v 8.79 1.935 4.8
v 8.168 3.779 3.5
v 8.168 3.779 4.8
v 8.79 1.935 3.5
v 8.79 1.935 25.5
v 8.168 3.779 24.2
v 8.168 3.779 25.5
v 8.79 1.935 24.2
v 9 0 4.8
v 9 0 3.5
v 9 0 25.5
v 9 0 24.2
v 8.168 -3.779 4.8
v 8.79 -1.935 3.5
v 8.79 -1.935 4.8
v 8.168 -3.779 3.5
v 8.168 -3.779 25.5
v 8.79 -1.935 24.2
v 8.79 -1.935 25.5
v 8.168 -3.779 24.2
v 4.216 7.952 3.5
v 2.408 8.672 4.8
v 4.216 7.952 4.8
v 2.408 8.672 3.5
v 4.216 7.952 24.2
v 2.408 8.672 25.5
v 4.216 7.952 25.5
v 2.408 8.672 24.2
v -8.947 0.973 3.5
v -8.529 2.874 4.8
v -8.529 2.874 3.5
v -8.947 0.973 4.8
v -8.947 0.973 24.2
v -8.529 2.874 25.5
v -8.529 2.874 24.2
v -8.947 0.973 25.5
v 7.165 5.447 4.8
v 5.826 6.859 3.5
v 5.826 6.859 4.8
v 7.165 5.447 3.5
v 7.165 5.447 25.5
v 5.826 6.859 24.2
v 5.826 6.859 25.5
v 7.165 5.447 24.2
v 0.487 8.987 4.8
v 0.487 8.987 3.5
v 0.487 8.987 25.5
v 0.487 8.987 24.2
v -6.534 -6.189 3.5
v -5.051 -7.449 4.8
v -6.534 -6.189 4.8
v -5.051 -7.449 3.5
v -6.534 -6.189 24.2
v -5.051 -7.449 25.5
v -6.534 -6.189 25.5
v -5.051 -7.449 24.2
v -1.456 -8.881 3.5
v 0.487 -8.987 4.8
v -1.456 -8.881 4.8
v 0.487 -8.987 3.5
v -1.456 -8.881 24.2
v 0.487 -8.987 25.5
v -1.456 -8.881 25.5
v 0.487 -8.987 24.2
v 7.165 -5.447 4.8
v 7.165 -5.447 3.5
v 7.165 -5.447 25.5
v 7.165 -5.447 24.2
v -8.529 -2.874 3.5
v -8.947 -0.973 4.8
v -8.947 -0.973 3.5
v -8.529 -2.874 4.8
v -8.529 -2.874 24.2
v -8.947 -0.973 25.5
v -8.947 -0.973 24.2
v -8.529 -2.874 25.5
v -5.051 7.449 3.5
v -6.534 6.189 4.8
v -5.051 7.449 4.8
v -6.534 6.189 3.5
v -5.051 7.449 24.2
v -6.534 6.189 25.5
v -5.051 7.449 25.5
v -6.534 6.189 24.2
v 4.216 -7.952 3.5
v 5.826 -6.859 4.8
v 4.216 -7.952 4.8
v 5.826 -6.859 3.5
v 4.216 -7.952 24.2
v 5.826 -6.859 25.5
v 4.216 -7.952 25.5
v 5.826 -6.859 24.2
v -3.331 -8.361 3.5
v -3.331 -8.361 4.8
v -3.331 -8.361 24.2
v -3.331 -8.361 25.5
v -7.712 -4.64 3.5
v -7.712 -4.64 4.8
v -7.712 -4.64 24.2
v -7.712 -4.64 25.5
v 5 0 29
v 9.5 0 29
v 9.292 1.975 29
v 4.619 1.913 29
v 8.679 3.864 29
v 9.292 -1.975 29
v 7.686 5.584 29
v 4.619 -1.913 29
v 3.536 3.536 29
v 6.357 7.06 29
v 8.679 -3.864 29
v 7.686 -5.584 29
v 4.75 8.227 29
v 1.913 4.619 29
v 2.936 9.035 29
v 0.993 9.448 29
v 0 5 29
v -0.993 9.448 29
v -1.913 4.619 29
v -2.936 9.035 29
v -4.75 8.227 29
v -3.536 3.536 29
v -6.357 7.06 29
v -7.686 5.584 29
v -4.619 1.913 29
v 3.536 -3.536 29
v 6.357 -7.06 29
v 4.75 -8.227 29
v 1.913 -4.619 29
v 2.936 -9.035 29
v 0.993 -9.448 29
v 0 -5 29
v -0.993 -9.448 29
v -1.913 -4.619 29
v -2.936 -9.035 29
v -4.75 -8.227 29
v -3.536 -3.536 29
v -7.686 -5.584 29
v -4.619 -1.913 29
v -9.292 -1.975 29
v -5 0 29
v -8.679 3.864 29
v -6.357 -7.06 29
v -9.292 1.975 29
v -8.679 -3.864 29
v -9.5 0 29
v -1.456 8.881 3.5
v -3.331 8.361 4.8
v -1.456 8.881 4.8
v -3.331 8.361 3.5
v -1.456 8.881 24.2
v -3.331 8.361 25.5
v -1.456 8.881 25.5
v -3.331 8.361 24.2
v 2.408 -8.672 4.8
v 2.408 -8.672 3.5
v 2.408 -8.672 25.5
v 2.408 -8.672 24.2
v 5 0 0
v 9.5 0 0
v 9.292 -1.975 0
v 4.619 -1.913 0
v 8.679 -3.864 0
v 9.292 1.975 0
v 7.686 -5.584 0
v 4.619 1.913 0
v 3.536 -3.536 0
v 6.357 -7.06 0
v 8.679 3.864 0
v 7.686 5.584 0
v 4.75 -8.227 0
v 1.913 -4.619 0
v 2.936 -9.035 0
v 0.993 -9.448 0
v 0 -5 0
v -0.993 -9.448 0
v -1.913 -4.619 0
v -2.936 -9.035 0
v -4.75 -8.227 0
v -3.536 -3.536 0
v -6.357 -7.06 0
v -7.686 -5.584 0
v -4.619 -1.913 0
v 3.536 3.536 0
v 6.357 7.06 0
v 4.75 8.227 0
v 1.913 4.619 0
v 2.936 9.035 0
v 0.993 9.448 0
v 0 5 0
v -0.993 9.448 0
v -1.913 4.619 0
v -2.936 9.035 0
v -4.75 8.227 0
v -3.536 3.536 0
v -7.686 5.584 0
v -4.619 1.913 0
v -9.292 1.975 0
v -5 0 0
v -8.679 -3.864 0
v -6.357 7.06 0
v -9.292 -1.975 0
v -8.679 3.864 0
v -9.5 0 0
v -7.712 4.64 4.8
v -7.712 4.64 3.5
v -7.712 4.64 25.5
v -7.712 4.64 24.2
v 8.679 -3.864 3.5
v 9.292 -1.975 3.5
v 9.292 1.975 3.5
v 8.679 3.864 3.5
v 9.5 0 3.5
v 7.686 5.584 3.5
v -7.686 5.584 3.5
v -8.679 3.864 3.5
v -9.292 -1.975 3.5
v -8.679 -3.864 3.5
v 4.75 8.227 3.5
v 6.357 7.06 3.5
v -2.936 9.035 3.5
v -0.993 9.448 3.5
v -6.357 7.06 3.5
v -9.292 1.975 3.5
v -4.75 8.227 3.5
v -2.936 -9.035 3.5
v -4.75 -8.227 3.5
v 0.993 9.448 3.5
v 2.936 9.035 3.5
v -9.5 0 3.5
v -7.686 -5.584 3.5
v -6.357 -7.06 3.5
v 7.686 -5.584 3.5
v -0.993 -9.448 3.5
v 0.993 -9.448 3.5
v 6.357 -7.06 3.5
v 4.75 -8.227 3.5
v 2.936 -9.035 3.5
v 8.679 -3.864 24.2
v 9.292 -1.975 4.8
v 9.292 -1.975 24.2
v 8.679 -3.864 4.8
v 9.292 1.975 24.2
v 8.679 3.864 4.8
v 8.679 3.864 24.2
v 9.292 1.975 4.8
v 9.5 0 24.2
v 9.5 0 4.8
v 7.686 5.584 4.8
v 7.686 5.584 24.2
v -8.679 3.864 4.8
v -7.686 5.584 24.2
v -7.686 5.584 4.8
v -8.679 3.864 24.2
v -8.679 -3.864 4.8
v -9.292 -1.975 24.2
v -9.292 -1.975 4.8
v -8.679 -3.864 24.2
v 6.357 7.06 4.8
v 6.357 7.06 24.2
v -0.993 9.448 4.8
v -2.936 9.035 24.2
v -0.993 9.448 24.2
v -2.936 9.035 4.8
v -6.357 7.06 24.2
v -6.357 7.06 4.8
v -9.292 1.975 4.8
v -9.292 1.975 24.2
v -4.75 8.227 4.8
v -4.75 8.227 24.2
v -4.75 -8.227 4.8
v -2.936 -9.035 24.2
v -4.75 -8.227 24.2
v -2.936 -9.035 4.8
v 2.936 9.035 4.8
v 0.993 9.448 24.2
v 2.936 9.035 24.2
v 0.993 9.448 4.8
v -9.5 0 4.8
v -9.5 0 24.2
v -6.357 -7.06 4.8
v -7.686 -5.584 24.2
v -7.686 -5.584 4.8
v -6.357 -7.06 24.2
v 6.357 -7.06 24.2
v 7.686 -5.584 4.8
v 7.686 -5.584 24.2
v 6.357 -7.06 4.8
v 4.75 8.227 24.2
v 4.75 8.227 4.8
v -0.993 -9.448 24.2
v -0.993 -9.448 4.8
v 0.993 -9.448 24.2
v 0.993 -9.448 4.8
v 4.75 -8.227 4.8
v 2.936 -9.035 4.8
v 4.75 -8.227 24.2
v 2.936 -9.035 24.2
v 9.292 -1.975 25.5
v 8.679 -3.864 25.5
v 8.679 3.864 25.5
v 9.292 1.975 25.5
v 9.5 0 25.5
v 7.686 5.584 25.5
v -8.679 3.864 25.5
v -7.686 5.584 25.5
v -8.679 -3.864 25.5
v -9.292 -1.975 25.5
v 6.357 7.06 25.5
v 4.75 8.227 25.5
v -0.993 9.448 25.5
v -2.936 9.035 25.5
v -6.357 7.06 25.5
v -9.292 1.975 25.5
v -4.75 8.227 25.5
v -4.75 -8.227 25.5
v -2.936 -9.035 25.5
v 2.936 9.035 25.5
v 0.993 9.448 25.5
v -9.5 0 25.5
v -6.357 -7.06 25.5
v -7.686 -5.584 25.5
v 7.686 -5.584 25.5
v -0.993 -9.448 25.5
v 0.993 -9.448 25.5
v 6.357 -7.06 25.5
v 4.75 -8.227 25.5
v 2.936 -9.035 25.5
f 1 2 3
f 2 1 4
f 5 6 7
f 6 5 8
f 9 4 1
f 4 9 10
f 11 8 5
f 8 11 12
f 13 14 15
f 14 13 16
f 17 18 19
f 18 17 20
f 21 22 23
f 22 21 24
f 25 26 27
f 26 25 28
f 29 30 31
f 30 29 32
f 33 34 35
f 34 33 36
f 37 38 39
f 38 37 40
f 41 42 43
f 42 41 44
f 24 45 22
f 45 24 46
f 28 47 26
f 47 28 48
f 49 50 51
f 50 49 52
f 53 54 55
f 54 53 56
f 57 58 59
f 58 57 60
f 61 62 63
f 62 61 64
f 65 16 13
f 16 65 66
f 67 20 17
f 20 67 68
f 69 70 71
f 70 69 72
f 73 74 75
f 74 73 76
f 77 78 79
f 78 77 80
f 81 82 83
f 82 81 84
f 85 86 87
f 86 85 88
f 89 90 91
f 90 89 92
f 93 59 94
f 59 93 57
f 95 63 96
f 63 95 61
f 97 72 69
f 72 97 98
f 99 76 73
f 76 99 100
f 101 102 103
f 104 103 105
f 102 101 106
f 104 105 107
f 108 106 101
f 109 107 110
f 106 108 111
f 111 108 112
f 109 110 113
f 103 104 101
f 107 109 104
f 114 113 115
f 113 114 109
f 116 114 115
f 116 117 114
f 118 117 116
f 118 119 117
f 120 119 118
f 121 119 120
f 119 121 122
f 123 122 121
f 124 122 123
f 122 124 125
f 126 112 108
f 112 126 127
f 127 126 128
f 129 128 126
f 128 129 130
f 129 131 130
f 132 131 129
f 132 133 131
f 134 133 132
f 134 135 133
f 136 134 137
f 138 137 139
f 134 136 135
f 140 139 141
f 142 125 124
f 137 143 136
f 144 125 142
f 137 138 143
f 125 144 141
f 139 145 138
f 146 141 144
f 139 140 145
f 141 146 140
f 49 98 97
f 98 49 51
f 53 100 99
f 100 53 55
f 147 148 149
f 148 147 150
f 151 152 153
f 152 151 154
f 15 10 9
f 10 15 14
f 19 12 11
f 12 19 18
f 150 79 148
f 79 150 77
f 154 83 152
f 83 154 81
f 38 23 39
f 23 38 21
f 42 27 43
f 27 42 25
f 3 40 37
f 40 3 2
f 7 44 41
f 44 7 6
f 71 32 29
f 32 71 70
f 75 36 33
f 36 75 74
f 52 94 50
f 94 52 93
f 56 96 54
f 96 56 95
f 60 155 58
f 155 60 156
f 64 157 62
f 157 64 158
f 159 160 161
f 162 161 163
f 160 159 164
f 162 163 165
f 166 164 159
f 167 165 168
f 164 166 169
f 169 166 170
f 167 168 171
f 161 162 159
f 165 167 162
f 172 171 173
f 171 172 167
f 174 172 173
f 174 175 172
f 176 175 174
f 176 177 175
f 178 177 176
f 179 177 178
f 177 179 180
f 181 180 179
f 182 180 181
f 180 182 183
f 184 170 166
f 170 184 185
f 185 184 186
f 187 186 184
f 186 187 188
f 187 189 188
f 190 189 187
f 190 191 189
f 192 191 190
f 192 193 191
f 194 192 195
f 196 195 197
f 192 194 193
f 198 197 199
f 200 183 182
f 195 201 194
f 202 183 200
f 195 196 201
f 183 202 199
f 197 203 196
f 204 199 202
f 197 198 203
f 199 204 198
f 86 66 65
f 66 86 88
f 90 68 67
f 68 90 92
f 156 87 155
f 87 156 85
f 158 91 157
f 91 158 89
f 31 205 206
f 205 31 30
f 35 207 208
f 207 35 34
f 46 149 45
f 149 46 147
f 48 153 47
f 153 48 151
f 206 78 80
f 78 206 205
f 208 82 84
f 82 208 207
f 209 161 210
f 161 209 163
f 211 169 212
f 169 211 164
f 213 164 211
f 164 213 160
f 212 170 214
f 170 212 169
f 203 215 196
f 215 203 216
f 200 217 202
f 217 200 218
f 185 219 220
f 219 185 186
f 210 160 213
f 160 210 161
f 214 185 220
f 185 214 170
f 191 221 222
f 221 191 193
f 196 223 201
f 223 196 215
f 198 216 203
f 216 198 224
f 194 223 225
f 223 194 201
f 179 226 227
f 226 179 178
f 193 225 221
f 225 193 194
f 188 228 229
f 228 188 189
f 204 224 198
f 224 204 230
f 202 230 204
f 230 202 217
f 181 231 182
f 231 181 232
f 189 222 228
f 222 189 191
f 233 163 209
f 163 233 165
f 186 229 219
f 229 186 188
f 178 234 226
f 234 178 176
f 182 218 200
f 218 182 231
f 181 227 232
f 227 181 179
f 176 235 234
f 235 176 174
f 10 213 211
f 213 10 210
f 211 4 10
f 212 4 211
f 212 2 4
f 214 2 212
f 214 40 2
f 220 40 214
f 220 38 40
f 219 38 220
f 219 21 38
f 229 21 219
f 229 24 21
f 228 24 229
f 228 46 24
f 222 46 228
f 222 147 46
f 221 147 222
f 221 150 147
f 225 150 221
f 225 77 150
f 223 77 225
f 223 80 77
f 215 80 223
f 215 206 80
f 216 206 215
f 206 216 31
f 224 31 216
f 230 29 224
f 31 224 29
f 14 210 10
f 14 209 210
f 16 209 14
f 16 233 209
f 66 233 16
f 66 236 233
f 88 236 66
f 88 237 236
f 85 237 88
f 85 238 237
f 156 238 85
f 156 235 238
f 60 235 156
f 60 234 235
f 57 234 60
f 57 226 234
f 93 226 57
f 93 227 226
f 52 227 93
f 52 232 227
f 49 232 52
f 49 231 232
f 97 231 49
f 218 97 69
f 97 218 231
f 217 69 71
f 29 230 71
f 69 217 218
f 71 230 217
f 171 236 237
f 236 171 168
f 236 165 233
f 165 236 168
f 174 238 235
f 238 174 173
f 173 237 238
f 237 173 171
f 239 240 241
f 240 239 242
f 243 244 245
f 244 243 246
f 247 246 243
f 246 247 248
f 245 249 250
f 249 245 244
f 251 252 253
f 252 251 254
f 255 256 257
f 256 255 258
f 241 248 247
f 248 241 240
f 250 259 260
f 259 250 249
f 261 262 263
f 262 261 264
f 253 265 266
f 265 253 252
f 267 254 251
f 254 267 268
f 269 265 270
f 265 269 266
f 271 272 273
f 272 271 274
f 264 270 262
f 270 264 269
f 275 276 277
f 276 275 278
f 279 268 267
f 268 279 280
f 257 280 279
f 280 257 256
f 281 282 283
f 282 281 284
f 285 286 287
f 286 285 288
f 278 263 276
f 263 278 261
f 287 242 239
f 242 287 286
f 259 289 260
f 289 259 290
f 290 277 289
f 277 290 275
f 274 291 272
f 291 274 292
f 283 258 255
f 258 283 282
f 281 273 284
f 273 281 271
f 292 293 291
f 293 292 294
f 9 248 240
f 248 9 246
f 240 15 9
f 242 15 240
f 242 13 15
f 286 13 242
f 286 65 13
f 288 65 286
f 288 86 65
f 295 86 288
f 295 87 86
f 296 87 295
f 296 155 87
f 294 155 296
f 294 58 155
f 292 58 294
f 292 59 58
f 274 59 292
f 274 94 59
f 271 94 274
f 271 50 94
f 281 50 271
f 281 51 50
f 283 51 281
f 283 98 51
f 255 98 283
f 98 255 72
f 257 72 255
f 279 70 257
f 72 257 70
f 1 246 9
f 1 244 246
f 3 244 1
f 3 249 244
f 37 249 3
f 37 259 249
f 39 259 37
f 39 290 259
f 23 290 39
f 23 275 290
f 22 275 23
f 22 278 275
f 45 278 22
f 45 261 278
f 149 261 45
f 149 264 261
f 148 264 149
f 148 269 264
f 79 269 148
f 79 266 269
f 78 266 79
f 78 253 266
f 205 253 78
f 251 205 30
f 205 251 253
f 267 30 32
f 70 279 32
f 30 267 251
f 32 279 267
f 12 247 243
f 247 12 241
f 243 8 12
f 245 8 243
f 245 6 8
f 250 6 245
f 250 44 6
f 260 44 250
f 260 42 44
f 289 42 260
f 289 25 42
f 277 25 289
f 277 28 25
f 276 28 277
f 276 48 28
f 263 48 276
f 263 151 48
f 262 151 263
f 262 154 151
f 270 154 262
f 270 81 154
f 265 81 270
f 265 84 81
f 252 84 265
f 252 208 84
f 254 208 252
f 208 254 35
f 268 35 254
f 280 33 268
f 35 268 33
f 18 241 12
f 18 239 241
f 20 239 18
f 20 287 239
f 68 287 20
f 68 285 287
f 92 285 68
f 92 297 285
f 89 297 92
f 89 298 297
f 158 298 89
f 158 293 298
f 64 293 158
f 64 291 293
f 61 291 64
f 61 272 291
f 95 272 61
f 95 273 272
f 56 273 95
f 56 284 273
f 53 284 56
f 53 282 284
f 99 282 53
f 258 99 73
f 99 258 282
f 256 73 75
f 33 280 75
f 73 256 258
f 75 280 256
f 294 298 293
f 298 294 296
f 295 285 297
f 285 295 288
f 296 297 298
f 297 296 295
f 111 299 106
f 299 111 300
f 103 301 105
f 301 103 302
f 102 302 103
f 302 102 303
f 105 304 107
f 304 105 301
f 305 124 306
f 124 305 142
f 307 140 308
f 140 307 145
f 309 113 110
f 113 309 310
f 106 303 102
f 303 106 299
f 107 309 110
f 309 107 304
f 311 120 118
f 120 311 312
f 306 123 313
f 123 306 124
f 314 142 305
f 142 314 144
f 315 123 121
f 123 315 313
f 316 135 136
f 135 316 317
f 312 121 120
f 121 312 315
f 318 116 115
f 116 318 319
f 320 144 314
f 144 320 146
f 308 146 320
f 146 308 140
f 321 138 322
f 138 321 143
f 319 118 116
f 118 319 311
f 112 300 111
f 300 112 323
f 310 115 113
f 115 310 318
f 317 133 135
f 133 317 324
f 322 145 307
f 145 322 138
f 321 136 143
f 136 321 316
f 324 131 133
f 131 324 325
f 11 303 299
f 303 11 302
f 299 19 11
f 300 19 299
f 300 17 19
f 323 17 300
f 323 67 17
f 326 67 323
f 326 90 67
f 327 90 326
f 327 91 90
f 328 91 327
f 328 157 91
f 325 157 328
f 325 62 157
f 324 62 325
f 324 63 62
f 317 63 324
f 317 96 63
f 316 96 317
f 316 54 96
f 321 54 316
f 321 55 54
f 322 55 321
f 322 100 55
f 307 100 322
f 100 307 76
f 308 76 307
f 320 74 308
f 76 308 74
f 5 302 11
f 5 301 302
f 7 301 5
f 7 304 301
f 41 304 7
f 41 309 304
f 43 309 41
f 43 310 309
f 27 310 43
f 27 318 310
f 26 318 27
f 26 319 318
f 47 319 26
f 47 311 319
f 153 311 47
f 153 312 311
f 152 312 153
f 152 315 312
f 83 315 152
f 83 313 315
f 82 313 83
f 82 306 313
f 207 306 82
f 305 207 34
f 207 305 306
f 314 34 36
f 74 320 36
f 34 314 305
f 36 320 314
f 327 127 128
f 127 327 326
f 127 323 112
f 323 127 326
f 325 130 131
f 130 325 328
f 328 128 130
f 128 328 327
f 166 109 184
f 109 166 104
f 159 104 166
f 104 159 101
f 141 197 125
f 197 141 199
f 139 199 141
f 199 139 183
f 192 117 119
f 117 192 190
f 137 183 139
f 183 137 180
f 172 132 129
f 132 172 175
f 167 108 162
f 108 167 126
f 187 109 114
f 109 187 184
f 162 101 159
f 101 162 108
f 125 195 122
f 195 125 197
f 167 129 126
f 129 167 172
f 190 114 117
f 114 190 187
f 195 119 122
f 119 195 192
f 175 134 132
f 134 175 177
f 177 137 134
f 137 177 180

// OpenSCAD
// file: bearing_dims.scad
/*
	bore = v[0];
	outer = v[1];
	len = v[2];
	ring_space = v[3];
	ring_dia = v[4];
	ring_gap = v[5];
*/

linear_bearing_dims = [
	[3,7,10,0,7,0],
	[4,8,12,0,8,0],
	[5,10,15,10.2,9.6,1.1],
	[6,12,19,13.5,11.5,1.1],
	[8,15,24,17.5,14.3,1.1],
	[10,19,29,22,18,1.3],
	[12,21,30,23,20,1.3],
	[13,23,32,23,22,1.3],
	[16,28,37,26.5,27,1.6],
	[20,32,42,30.5,30.5,1.6],
	[25,40,59,41,38,1.85],
	[30,45,64,44.5,43,1.85],
	[35,52,70,49.5,49,2.1],
	[40,60,80,60.5,57,2.1],
	[50,80,100,74,76.5,2.6],
	[60,90,110,85,86.5,3.15],
	[80,120,140,105.5,116,4.15],
	[100,150,150,125.5,145,4.15]
];

/*
	d = v[0];
	h = v[1];
	e = v[2];
	w = v[3];		// overall width
	l = v[4];		// overall length
	f = v[5];
	g = v[6];
	b = v[7];		// screw spacing along width
	c = v[8];		// screw spacing along length
	k = v[9];
	t = v[10];
	s1 = v[11];
	s2 = v[12];
	L1 = v[13];
*/

linear_bearing_block_dims = [
	[6,9,15,30,25,18,15,20,15,5,6,4,3.4,8],
	[8,11,17,34,30,22,18,24,18,5,6,4,3.4,8],
	[10,13,20,40,35,26,21,28,21,6,8,5,4.3,12],
	[12,15,21,42,36,28,24,30.5,26,5.75,8,5,4.3,12],
	[13,15,22,44,39,30,24.5,33,26,5.5,8,5,4.3,12],
	[16,19,25,50,44,38.5,32.5,36,34,7,9,5,4.3,12],
	[20,21,27,54,50,41,35,40,40,7,11,6,5.2,12],
	[25,26,38,76,67,51.5,42,54,50,11,12,8,7,18],
	[30,30,39,78,72,59.5,49,58,58,10,15,8,7,18],
	[35,34,45,90,80,68,54,70,60,10,18,8,7,18],
	[40,40,51,102,90,78,62,80,60,11,20,10,8.7,25],
	[50,52,61,122,110,102,80,100,80,11,25,10,8.7,25],
	[60,58,66,132,122,114,94,108,90,12,30,10,10.7,25]
];

linear_bearing_long_block_dims = [
	[8,11,17,34,59,22,18,24,42,5,6,4,3.4,8],
	[10,13,20,40,68,26,21,28,46,6,8,5,4.3,12],
	[12,15,21,42,70,28,24,30.5,50,5.75,8,5,4.3,12],
	[13,15,22,44,75,30,24.5,33,50,5.5,8,5,4.3,12],
	[16,19,25,50,85,38.5,32.5,36,60,7,9,5,4.3,12],
	[20,21,27,54,96,41,35,40,70,7,11,6,5.2,12],
	[25,26,38,76,130,51.5,42,54,100,11,12,8,7,18],
	[30,30,39,78,140,59.5,49,58,110,10,15,8,7,18],
	[35,34,45,90,155,68,54,70,120,10,18,8,7,18],
	[40,40,51,102,175,78,62,80,140,11,20,10,8.7,25],
];

/*
	d = v[0];
	D = v[1];
	L = v[2];
	D1 = v[3];
	H = v[4];
	pcd = v[5];
	d1 = v[6];
	d2 = v[7];
	h = v[8];
*/

linear_bearing_round_flange_dims = [
	[6,12,19,28,5,20,3.4,6.5,3.3],
	[8,15,24,32,5,24,3.4,6.5,3.3],
	[10,19,29,40,6,29,4.5,8,4.4],
	[12,21,30,42,6,32,4.5,8,4.4],
	[13,23,32,43,6,33,4.5,8,4.4],
	[16,28,37,48,6,38,4.5,8,4.4],
	[20,32,42,54,8,43,5.5,9.5,5.4],
	[25,40,59,62,8,51,5.5,9.5,5.4],
	[30,45,64,74,10,60,6.6,11,6.5],
	[35,52,70,82,10,67,6.6,11,6.5],
	[40,60,80,96,13,78,9,14,8.6],
	[50,80,100,116,13,98,9,14,8.6],
	[60,90,110,134,18,112,11,17.5,10.6]
];

function get_dims_for_shaft_size(shaft_size, dims) = 
	dims[search(shaft_size, dims, 1, 0)[0]];
// main file
include <bearing_dims.scad>;

module draw_linear_bearing(v)
{
	bore = v[0];
	outer = v[1];
	len = v[2];
	ring_space = v[3];
	ring_dia = v[4];
	ring_gap = v[5];

	ends_len = (len - ring_space) / 2;
	ctr_len = ring_space - (ring_gap * 2);

	difference()
	{
		union()
		{
			cylinder(r=ring_dia / 2, h = len);
			cylinder(r=outer / 2, h = ends_len);
			translate([0, 0, ends_len + ring_gap])
				cylinder(r=outer / 2, h = ctr_len);
			translate([0, 0, ends_len + ring_space])
				cylinder(r=outer / 2, h = ends_len);
		}

		translate([0, 0, -0.1])
			cylinder(r=bore / 2, h = len + 0.2);
	}
}

module linear_bearing(shaft_size)
{
	d = get_dims_for_shaft_size(shaft_size, linear_bearing_dims);
	draw_linear_bearing(d);
}

linear_bearing(10);
